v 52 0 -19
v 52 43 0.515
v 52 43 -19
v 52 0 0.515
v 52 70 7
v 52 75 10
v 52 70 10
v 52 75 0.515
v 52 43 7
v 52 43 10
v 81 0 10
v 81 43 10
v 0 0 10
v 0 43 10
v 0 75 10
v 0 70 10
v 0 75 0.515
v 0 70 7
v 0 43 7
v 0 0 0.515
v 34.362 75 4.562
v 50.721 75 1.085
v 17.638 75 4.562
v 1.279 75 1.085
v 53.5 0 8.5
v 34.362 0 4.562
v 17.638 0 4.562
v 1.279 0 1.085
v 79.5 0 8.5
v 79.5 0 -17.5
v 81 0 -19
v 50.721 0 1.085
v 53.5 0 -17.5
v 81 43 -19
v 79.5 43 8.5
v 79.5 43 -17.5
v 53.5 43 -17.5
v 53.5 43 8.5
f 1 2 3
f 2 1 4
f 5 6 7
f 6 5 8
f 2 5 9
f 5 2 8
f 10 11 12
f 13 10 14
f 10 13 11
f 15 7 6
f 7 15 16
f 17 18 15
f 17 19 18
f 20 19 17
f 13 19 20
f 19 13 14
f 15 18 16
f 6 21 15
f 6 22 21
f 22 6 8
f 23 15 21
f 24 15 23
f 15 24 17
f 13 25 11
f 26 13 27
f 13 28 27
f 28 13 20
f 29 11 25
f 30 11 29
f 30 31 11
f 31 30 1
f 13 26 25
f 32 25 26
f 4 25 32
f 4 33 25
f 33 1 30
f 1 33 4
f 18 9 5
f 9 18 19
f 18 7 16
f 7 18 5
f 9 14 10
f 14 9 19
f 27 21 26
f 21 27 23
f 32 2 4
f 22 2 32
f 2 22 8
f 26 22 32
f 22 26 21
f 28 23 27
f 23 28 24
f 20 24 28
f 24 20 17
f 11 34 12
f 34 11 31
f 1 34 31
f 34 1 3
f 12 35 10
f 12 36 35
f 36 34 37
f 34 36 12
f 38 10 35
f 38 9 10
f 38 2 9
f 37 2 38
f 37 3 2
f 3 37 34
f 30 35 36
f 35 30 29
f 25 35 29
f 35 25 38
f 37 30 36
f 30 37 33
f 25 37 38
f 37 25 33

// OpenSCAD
difference(){
    scale([52,75,10]) cube(1,1,1);
    translate([0,75-27-5,10-3]) scale([52,27,3]) cube(1,1,1);
    translate([26,80,-75]) rotate([90,0,0]) cylinder(d=160,h=100);
}

translate([52,0,-29+10]) difference(){
    scale([29,75-27-5,29]) cube(1,1,1);
    translate([1.5,0,1.5]) scale([26,52,26]) cube(1,1,1);
}
